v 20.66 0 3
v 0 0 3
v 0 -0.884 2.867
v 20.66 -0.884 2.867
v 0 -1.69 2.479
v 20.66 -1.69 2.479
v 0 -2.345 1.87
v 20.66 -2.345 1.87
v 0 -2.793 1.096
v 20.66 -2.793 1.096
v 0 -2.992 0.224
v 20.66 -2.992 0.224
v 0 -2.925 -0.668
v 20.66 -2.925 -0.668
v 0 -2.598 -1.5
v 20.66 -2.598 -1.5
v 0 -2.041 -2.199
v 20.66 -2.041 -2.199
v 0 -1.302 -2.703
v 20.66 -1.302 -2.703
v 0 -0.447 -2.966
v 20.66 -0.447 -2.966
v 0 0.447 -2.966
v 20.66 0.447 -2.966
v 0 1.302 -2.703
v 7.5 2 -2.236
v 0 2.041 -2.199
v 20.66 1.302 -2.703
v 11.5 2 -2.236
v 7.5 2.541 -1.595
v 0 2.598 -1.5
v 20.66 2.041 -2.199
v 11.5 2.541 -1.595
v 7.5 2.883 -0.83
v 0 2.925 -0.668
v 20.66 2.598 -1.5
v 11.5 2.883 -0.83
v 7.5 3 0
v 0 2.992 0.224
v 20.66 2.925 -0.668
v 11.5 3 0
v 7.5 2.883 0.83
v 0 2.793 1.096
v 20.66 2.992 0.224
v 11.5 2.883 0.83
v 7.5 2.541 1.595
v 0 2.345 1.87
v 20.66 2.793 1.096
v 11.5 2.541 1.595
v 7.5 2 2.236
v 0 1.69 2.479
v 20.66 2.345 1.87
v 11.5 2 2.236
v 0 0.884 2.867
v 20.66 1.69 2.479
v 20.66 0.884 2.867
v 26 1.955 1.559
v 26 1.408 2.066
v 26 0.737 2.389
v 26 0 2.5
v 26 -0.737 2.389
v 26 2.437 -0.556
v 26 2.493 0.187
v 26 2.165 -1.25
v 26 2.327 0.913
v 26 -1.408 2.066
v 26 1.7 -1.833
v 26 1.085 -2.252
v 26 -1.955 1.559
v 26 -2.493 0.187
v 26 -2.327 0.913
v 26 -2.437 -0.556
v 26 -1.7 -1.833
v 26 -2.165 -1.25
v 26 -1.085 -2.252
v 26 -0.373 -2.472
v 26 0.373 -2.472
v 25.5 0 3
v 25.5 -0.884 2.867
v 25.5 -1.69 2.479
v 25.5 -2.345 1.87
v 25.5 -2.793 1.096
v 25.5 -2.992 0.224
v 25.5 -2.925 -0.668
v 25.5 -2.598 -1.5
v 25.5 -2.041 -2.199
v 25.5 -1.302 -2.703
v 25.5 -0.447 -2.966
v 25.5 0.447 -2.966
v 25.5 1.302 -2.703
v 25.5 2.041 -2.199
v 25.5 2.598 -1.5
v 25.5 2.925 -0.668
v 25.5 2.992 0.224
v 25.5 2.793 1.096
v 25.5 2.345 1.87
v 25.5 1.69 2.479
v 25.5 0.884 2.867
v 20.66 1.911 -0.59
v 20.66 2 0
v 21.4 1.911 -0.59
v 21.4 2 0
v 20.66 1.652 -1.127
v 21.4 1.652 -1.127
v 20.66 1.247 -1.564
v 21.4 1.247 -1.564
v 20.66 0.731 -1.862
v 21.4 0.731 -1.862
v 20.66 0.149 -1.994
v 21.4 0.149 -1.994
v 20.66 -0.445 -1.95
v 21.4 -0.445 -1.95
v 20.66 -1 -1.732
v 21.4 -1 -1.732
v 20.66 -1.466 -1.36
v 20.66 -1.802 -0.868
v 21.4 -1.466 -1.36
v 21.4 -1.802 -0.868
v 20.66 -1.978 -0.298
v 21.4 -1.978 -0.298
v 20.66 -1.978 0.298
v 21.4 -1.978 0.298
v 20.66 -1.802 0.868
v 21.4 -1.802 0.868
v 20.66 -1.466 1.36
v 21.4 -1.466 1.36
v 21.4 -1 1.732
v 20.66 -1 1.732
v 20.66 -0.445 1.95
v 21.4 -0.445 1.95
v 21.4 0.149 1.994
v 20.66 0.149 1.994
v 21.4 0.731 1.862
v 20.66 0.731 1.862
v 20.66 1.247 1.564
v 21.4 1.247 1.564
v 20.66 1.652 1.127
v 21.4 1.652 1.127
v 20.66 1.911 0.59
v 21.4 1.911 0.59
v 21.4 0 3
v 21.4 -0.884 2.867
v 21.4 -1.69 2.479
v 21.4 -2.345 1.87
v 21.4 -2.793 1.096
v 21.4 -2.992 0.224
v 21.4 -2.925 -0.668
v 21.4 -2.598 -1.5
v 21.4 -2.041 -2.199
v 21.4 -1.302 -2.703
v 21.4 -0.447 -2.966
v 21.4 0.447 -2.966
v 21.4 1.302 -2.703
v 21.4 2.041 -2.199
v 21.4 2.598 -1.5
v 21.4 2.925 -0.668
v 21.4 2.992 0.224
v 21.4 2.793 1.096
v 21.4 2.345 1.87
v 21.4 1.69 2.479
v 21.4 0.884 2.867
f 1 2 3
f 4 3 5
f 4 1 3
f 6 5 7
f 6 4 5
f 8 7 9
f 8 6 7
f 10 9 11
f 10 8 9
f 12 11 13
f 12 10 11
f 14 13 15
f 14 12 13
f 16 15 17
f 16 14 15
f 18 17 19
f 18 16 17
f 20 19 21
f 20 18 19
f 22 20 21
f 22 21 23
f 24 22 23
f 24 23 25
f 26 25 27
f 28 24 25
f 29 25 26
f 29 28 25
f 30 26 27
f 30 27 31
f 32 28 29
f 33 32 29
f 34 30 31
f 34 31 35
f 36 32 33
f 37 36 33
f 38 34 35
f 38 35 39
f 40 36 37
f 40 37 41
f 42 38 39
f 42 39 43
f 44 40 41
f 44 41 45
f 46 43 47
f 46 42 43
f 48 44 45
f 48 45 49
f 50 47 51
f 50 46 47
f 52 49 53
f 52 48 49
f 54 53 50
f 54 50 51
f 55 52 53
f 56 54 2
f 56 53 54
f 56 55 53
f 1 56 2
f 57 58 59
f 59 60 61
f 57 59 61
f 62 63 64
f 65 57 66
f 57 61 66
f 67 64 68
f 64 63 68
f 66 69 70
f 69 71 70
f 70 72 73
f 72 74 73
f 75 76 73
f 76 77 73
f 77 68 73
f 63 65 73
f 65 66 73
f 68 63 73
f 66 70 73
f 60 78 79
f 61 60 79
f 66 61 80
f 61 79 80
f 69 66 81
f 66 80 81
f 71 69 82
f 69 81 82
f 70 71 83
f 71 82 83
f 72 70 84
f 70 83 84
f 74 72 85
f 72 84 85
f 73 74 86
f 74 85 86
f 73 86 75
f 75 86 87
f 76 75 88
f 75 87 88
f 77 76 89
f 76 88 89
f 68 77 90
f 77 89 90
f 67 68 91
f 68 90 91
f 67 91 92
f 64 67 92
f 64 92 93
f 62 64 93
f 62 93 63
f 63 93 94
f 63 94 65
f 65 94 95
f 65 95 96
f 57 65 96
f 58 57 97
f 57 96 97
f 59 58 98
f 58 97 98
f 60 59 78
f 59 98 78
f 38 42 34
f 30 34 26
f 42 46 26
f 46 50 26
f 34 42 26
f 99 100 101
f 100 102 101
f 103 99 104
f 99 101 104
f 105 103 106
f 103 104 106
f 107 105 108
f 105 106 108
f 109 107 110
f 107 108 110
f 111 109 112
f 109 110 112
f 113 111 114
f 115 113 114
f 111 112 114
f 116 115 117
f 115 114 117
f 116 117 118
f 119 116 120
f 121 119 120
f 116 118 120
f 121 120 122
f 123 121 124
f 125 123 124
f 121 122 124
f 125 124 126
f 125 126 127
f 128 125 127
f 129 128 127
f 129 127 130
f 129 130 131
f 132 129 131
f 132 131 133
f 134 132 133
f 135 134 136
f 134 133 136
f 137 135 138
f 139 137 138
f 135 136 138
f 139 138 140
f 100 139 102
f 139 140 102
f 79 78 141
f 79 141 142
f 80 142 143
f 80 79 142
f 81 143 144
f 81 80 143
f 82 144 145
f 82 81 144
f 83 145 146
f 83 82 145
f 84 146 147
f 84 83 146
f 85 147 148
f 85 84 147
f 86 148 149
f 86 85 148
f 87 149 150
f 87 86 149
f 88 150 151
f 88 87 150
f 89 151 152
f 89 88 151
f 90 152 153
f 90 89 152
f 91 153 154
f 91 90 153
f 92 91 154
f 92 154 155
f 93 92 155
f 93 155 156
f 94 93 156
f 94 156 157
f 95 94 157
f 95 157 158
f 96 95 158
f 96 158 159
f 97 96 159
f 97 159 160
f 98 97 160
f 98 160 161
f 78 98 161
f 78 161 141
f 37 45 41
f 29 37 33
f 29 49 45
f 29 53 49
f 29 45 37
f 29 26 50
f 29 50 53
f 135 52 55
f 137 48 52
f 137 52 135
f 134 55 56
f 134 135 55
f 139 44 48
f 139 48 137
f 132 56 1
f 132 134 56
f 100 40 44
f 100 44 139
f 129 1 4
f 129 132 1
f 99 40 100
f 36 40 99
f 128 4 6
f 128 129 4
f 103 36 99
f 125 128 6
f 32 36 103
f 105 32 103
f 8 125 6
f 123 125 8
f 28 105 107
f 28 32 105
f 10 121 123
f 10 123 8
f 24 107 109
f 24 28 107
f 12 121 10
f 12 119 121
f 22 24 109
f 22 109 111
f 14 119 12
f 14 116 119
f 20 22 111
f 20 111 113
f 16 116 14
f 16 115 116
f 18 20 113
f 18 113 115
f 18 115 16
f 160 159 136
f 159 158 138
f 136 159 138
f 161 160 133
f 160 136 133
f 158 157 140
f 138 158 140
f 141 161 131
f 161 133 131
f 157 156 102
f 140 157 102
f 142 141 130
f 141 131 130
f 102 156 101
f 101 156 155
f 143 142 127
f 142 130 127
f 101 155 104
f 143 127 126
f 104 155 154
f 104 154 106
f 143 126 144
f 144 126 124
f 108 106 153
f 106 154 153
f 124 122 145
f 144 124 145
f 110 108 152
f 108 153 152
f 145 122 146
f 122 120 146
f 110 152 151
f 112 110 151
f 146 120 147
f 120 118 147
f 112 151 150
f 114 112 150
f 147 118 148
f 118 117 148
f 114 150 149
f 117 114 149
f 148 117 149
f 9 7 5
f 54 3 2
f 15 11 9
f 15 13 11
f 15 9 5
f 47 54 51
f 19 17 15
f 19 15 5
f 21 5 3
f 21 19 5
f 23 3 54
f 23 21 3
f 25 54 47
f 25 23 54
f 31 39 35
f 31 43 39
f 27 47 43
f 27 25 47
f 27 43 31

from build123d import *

# Parameters (mm, degrees)
ESQUISSE1_W                  = 52
ESQUISSE1_H                  = 3
CHANFREIN1_SIZE              = 0.5
ENL_V_MAT_EXTRU_1_DEPTH      = 27.343879745
ENL_V_MAT_EXTRU_1_DEPTH_BACK = 27.343879745
ESQUISSE2_W                  = 4
ESQUISSE2_H                  = 2
ESQUISSE3_W                  = 0.74
ESQUISSE3_H                  = 1
BOSS_EXTRU_1_START           = 15
ESQUISSE4_R                  = 3
BOSS_EXTRU_1_DEPTH           = 15
ENL_V_MAT_EXTRU_2_DEPTH      = 42.218927691
ENL_V_MAT_EXTRU_2_DEPTH_BACK = 42.218927691
ESQUISSE5_W                  = 12
ESQUISSE5_H                  = 1
ENL_V_MAT_EXTRU_3_DEPTH      = 42.218927691
ENL_V_MAT_EXTRU_3_DEPTH_BACK = 42.218927691
ESQUISSE6_W                  = 50.211323454
ESQUISSE6_H                  = 20.21753951


with BuildPart() as part:
    # Esquisse1 → Révolution1 (revolve)
    with BuildSketch(Plane.XY, mode=Mode.PRIVATE) as r_volution1_sk:
        with Locations((0, 1.5)):
            Rectangle(ESQUISSE1_W, ESQUISSE1_H)
    revolve(r_volution1_sk.sketch.rotate(Axis((0, 0, 0), (1, 0, 0)), 90), axis=Axis((0, 0, 0), (1, 0, 0)))

    # Chanfrein1
    chanfrein1_edges = [part.edges().sort_by_distance(p)[0] for p in [
        (26, 0, -3),
    ]]
    chamfer(chanfrein1_edges, length=CHANFREIN1_SIZE)

    # Esquisse2 → Enlèv. mat.-Extru.1 (cut, two sides: drawn at the far end of the back side and taken through both)
    with BuildSketch(Plane.XY.offset(-ENL_V_MAT_EXTRU_1_DEPTH_BACK)):
        with Locations((9.5, 3)):
            Rectangle(ESQUISSE2_W, ESQUISSE2_H)
    extrude(amount=ENL_V_MAT_EXTRU_1_DEPTH + ENL_V_MAT_EXTRU_1_DEPTH_BACK, mode=Mode.SUBTRACT)

    # Esquisse3 → Enlèvement de matière-Révolution1 (revolve, cut)
    with BuildSketch(Plane.XY):
        with Locations((-21.03, 2.5)):
            Rectangle(ESQUISSE3_W, ESQUISSE3_H)
        with Locations((21.03, 2.5)):
            Rectangle(ESQUISSE3_W, ESQUISSE3_H)
    revolve(axis=Axis((0, 0, 0), (-1, 0, 0)), mode=Mode.SUBTRACT)

    # Esquisse4 → Boss.-Extru.1 (add)
    with BuildSketch(Plane.ZY.offset(26).offset(BOSS_EXTRU_1_START)):
        with Locations(Location((0, 0, 0), (0, 0, 90))):
            Circle(ESQUISSE4_R)
    extrude(amount=-BOSS_EXTRU_1_DEPTH)

    # Esquisse5 → Enlèv. mat.-Extru.2 (cut, two sides: drawn at the far end of the back side and taken through both)
    with BuildSketch(Plane.XY.offset(-ENL_V_MAT_EXTRU_2_DEPTH_BACK)):
        with Locations((-35, 2.5)):
            Rectangle(ESQUISSE5_W, ESQUISSE5_H)
    extrude(amount=ENL_V_MAT_EXTRU_2_DEPTH + ENL_V_MAT_EXTRU_2_DEPTH_BACK, mode=Mode.SUBTRACT)

    # Esquisse6 → Enlèv. mat.-Extru.3 (cut, two sides: drawn at the far end of the back side and taken through both)
    with BuildSketch(Plane.XY.offset(-ENL_V_MAT_EXTRU_3_DEPTH_BACK)):
        with Locations((-25.105661727, 1.097333559)):
            Rectangle(ESQUISSE6_W, ESQUISSE6_H)
    extrude(amount=ENL_V_MAT_EXTRU_3_DEPTH + ENL_V_MAT_EXTRU_3_DEPTH_BACK, mode=Mode.SUBTRACT)


solid = part.part
